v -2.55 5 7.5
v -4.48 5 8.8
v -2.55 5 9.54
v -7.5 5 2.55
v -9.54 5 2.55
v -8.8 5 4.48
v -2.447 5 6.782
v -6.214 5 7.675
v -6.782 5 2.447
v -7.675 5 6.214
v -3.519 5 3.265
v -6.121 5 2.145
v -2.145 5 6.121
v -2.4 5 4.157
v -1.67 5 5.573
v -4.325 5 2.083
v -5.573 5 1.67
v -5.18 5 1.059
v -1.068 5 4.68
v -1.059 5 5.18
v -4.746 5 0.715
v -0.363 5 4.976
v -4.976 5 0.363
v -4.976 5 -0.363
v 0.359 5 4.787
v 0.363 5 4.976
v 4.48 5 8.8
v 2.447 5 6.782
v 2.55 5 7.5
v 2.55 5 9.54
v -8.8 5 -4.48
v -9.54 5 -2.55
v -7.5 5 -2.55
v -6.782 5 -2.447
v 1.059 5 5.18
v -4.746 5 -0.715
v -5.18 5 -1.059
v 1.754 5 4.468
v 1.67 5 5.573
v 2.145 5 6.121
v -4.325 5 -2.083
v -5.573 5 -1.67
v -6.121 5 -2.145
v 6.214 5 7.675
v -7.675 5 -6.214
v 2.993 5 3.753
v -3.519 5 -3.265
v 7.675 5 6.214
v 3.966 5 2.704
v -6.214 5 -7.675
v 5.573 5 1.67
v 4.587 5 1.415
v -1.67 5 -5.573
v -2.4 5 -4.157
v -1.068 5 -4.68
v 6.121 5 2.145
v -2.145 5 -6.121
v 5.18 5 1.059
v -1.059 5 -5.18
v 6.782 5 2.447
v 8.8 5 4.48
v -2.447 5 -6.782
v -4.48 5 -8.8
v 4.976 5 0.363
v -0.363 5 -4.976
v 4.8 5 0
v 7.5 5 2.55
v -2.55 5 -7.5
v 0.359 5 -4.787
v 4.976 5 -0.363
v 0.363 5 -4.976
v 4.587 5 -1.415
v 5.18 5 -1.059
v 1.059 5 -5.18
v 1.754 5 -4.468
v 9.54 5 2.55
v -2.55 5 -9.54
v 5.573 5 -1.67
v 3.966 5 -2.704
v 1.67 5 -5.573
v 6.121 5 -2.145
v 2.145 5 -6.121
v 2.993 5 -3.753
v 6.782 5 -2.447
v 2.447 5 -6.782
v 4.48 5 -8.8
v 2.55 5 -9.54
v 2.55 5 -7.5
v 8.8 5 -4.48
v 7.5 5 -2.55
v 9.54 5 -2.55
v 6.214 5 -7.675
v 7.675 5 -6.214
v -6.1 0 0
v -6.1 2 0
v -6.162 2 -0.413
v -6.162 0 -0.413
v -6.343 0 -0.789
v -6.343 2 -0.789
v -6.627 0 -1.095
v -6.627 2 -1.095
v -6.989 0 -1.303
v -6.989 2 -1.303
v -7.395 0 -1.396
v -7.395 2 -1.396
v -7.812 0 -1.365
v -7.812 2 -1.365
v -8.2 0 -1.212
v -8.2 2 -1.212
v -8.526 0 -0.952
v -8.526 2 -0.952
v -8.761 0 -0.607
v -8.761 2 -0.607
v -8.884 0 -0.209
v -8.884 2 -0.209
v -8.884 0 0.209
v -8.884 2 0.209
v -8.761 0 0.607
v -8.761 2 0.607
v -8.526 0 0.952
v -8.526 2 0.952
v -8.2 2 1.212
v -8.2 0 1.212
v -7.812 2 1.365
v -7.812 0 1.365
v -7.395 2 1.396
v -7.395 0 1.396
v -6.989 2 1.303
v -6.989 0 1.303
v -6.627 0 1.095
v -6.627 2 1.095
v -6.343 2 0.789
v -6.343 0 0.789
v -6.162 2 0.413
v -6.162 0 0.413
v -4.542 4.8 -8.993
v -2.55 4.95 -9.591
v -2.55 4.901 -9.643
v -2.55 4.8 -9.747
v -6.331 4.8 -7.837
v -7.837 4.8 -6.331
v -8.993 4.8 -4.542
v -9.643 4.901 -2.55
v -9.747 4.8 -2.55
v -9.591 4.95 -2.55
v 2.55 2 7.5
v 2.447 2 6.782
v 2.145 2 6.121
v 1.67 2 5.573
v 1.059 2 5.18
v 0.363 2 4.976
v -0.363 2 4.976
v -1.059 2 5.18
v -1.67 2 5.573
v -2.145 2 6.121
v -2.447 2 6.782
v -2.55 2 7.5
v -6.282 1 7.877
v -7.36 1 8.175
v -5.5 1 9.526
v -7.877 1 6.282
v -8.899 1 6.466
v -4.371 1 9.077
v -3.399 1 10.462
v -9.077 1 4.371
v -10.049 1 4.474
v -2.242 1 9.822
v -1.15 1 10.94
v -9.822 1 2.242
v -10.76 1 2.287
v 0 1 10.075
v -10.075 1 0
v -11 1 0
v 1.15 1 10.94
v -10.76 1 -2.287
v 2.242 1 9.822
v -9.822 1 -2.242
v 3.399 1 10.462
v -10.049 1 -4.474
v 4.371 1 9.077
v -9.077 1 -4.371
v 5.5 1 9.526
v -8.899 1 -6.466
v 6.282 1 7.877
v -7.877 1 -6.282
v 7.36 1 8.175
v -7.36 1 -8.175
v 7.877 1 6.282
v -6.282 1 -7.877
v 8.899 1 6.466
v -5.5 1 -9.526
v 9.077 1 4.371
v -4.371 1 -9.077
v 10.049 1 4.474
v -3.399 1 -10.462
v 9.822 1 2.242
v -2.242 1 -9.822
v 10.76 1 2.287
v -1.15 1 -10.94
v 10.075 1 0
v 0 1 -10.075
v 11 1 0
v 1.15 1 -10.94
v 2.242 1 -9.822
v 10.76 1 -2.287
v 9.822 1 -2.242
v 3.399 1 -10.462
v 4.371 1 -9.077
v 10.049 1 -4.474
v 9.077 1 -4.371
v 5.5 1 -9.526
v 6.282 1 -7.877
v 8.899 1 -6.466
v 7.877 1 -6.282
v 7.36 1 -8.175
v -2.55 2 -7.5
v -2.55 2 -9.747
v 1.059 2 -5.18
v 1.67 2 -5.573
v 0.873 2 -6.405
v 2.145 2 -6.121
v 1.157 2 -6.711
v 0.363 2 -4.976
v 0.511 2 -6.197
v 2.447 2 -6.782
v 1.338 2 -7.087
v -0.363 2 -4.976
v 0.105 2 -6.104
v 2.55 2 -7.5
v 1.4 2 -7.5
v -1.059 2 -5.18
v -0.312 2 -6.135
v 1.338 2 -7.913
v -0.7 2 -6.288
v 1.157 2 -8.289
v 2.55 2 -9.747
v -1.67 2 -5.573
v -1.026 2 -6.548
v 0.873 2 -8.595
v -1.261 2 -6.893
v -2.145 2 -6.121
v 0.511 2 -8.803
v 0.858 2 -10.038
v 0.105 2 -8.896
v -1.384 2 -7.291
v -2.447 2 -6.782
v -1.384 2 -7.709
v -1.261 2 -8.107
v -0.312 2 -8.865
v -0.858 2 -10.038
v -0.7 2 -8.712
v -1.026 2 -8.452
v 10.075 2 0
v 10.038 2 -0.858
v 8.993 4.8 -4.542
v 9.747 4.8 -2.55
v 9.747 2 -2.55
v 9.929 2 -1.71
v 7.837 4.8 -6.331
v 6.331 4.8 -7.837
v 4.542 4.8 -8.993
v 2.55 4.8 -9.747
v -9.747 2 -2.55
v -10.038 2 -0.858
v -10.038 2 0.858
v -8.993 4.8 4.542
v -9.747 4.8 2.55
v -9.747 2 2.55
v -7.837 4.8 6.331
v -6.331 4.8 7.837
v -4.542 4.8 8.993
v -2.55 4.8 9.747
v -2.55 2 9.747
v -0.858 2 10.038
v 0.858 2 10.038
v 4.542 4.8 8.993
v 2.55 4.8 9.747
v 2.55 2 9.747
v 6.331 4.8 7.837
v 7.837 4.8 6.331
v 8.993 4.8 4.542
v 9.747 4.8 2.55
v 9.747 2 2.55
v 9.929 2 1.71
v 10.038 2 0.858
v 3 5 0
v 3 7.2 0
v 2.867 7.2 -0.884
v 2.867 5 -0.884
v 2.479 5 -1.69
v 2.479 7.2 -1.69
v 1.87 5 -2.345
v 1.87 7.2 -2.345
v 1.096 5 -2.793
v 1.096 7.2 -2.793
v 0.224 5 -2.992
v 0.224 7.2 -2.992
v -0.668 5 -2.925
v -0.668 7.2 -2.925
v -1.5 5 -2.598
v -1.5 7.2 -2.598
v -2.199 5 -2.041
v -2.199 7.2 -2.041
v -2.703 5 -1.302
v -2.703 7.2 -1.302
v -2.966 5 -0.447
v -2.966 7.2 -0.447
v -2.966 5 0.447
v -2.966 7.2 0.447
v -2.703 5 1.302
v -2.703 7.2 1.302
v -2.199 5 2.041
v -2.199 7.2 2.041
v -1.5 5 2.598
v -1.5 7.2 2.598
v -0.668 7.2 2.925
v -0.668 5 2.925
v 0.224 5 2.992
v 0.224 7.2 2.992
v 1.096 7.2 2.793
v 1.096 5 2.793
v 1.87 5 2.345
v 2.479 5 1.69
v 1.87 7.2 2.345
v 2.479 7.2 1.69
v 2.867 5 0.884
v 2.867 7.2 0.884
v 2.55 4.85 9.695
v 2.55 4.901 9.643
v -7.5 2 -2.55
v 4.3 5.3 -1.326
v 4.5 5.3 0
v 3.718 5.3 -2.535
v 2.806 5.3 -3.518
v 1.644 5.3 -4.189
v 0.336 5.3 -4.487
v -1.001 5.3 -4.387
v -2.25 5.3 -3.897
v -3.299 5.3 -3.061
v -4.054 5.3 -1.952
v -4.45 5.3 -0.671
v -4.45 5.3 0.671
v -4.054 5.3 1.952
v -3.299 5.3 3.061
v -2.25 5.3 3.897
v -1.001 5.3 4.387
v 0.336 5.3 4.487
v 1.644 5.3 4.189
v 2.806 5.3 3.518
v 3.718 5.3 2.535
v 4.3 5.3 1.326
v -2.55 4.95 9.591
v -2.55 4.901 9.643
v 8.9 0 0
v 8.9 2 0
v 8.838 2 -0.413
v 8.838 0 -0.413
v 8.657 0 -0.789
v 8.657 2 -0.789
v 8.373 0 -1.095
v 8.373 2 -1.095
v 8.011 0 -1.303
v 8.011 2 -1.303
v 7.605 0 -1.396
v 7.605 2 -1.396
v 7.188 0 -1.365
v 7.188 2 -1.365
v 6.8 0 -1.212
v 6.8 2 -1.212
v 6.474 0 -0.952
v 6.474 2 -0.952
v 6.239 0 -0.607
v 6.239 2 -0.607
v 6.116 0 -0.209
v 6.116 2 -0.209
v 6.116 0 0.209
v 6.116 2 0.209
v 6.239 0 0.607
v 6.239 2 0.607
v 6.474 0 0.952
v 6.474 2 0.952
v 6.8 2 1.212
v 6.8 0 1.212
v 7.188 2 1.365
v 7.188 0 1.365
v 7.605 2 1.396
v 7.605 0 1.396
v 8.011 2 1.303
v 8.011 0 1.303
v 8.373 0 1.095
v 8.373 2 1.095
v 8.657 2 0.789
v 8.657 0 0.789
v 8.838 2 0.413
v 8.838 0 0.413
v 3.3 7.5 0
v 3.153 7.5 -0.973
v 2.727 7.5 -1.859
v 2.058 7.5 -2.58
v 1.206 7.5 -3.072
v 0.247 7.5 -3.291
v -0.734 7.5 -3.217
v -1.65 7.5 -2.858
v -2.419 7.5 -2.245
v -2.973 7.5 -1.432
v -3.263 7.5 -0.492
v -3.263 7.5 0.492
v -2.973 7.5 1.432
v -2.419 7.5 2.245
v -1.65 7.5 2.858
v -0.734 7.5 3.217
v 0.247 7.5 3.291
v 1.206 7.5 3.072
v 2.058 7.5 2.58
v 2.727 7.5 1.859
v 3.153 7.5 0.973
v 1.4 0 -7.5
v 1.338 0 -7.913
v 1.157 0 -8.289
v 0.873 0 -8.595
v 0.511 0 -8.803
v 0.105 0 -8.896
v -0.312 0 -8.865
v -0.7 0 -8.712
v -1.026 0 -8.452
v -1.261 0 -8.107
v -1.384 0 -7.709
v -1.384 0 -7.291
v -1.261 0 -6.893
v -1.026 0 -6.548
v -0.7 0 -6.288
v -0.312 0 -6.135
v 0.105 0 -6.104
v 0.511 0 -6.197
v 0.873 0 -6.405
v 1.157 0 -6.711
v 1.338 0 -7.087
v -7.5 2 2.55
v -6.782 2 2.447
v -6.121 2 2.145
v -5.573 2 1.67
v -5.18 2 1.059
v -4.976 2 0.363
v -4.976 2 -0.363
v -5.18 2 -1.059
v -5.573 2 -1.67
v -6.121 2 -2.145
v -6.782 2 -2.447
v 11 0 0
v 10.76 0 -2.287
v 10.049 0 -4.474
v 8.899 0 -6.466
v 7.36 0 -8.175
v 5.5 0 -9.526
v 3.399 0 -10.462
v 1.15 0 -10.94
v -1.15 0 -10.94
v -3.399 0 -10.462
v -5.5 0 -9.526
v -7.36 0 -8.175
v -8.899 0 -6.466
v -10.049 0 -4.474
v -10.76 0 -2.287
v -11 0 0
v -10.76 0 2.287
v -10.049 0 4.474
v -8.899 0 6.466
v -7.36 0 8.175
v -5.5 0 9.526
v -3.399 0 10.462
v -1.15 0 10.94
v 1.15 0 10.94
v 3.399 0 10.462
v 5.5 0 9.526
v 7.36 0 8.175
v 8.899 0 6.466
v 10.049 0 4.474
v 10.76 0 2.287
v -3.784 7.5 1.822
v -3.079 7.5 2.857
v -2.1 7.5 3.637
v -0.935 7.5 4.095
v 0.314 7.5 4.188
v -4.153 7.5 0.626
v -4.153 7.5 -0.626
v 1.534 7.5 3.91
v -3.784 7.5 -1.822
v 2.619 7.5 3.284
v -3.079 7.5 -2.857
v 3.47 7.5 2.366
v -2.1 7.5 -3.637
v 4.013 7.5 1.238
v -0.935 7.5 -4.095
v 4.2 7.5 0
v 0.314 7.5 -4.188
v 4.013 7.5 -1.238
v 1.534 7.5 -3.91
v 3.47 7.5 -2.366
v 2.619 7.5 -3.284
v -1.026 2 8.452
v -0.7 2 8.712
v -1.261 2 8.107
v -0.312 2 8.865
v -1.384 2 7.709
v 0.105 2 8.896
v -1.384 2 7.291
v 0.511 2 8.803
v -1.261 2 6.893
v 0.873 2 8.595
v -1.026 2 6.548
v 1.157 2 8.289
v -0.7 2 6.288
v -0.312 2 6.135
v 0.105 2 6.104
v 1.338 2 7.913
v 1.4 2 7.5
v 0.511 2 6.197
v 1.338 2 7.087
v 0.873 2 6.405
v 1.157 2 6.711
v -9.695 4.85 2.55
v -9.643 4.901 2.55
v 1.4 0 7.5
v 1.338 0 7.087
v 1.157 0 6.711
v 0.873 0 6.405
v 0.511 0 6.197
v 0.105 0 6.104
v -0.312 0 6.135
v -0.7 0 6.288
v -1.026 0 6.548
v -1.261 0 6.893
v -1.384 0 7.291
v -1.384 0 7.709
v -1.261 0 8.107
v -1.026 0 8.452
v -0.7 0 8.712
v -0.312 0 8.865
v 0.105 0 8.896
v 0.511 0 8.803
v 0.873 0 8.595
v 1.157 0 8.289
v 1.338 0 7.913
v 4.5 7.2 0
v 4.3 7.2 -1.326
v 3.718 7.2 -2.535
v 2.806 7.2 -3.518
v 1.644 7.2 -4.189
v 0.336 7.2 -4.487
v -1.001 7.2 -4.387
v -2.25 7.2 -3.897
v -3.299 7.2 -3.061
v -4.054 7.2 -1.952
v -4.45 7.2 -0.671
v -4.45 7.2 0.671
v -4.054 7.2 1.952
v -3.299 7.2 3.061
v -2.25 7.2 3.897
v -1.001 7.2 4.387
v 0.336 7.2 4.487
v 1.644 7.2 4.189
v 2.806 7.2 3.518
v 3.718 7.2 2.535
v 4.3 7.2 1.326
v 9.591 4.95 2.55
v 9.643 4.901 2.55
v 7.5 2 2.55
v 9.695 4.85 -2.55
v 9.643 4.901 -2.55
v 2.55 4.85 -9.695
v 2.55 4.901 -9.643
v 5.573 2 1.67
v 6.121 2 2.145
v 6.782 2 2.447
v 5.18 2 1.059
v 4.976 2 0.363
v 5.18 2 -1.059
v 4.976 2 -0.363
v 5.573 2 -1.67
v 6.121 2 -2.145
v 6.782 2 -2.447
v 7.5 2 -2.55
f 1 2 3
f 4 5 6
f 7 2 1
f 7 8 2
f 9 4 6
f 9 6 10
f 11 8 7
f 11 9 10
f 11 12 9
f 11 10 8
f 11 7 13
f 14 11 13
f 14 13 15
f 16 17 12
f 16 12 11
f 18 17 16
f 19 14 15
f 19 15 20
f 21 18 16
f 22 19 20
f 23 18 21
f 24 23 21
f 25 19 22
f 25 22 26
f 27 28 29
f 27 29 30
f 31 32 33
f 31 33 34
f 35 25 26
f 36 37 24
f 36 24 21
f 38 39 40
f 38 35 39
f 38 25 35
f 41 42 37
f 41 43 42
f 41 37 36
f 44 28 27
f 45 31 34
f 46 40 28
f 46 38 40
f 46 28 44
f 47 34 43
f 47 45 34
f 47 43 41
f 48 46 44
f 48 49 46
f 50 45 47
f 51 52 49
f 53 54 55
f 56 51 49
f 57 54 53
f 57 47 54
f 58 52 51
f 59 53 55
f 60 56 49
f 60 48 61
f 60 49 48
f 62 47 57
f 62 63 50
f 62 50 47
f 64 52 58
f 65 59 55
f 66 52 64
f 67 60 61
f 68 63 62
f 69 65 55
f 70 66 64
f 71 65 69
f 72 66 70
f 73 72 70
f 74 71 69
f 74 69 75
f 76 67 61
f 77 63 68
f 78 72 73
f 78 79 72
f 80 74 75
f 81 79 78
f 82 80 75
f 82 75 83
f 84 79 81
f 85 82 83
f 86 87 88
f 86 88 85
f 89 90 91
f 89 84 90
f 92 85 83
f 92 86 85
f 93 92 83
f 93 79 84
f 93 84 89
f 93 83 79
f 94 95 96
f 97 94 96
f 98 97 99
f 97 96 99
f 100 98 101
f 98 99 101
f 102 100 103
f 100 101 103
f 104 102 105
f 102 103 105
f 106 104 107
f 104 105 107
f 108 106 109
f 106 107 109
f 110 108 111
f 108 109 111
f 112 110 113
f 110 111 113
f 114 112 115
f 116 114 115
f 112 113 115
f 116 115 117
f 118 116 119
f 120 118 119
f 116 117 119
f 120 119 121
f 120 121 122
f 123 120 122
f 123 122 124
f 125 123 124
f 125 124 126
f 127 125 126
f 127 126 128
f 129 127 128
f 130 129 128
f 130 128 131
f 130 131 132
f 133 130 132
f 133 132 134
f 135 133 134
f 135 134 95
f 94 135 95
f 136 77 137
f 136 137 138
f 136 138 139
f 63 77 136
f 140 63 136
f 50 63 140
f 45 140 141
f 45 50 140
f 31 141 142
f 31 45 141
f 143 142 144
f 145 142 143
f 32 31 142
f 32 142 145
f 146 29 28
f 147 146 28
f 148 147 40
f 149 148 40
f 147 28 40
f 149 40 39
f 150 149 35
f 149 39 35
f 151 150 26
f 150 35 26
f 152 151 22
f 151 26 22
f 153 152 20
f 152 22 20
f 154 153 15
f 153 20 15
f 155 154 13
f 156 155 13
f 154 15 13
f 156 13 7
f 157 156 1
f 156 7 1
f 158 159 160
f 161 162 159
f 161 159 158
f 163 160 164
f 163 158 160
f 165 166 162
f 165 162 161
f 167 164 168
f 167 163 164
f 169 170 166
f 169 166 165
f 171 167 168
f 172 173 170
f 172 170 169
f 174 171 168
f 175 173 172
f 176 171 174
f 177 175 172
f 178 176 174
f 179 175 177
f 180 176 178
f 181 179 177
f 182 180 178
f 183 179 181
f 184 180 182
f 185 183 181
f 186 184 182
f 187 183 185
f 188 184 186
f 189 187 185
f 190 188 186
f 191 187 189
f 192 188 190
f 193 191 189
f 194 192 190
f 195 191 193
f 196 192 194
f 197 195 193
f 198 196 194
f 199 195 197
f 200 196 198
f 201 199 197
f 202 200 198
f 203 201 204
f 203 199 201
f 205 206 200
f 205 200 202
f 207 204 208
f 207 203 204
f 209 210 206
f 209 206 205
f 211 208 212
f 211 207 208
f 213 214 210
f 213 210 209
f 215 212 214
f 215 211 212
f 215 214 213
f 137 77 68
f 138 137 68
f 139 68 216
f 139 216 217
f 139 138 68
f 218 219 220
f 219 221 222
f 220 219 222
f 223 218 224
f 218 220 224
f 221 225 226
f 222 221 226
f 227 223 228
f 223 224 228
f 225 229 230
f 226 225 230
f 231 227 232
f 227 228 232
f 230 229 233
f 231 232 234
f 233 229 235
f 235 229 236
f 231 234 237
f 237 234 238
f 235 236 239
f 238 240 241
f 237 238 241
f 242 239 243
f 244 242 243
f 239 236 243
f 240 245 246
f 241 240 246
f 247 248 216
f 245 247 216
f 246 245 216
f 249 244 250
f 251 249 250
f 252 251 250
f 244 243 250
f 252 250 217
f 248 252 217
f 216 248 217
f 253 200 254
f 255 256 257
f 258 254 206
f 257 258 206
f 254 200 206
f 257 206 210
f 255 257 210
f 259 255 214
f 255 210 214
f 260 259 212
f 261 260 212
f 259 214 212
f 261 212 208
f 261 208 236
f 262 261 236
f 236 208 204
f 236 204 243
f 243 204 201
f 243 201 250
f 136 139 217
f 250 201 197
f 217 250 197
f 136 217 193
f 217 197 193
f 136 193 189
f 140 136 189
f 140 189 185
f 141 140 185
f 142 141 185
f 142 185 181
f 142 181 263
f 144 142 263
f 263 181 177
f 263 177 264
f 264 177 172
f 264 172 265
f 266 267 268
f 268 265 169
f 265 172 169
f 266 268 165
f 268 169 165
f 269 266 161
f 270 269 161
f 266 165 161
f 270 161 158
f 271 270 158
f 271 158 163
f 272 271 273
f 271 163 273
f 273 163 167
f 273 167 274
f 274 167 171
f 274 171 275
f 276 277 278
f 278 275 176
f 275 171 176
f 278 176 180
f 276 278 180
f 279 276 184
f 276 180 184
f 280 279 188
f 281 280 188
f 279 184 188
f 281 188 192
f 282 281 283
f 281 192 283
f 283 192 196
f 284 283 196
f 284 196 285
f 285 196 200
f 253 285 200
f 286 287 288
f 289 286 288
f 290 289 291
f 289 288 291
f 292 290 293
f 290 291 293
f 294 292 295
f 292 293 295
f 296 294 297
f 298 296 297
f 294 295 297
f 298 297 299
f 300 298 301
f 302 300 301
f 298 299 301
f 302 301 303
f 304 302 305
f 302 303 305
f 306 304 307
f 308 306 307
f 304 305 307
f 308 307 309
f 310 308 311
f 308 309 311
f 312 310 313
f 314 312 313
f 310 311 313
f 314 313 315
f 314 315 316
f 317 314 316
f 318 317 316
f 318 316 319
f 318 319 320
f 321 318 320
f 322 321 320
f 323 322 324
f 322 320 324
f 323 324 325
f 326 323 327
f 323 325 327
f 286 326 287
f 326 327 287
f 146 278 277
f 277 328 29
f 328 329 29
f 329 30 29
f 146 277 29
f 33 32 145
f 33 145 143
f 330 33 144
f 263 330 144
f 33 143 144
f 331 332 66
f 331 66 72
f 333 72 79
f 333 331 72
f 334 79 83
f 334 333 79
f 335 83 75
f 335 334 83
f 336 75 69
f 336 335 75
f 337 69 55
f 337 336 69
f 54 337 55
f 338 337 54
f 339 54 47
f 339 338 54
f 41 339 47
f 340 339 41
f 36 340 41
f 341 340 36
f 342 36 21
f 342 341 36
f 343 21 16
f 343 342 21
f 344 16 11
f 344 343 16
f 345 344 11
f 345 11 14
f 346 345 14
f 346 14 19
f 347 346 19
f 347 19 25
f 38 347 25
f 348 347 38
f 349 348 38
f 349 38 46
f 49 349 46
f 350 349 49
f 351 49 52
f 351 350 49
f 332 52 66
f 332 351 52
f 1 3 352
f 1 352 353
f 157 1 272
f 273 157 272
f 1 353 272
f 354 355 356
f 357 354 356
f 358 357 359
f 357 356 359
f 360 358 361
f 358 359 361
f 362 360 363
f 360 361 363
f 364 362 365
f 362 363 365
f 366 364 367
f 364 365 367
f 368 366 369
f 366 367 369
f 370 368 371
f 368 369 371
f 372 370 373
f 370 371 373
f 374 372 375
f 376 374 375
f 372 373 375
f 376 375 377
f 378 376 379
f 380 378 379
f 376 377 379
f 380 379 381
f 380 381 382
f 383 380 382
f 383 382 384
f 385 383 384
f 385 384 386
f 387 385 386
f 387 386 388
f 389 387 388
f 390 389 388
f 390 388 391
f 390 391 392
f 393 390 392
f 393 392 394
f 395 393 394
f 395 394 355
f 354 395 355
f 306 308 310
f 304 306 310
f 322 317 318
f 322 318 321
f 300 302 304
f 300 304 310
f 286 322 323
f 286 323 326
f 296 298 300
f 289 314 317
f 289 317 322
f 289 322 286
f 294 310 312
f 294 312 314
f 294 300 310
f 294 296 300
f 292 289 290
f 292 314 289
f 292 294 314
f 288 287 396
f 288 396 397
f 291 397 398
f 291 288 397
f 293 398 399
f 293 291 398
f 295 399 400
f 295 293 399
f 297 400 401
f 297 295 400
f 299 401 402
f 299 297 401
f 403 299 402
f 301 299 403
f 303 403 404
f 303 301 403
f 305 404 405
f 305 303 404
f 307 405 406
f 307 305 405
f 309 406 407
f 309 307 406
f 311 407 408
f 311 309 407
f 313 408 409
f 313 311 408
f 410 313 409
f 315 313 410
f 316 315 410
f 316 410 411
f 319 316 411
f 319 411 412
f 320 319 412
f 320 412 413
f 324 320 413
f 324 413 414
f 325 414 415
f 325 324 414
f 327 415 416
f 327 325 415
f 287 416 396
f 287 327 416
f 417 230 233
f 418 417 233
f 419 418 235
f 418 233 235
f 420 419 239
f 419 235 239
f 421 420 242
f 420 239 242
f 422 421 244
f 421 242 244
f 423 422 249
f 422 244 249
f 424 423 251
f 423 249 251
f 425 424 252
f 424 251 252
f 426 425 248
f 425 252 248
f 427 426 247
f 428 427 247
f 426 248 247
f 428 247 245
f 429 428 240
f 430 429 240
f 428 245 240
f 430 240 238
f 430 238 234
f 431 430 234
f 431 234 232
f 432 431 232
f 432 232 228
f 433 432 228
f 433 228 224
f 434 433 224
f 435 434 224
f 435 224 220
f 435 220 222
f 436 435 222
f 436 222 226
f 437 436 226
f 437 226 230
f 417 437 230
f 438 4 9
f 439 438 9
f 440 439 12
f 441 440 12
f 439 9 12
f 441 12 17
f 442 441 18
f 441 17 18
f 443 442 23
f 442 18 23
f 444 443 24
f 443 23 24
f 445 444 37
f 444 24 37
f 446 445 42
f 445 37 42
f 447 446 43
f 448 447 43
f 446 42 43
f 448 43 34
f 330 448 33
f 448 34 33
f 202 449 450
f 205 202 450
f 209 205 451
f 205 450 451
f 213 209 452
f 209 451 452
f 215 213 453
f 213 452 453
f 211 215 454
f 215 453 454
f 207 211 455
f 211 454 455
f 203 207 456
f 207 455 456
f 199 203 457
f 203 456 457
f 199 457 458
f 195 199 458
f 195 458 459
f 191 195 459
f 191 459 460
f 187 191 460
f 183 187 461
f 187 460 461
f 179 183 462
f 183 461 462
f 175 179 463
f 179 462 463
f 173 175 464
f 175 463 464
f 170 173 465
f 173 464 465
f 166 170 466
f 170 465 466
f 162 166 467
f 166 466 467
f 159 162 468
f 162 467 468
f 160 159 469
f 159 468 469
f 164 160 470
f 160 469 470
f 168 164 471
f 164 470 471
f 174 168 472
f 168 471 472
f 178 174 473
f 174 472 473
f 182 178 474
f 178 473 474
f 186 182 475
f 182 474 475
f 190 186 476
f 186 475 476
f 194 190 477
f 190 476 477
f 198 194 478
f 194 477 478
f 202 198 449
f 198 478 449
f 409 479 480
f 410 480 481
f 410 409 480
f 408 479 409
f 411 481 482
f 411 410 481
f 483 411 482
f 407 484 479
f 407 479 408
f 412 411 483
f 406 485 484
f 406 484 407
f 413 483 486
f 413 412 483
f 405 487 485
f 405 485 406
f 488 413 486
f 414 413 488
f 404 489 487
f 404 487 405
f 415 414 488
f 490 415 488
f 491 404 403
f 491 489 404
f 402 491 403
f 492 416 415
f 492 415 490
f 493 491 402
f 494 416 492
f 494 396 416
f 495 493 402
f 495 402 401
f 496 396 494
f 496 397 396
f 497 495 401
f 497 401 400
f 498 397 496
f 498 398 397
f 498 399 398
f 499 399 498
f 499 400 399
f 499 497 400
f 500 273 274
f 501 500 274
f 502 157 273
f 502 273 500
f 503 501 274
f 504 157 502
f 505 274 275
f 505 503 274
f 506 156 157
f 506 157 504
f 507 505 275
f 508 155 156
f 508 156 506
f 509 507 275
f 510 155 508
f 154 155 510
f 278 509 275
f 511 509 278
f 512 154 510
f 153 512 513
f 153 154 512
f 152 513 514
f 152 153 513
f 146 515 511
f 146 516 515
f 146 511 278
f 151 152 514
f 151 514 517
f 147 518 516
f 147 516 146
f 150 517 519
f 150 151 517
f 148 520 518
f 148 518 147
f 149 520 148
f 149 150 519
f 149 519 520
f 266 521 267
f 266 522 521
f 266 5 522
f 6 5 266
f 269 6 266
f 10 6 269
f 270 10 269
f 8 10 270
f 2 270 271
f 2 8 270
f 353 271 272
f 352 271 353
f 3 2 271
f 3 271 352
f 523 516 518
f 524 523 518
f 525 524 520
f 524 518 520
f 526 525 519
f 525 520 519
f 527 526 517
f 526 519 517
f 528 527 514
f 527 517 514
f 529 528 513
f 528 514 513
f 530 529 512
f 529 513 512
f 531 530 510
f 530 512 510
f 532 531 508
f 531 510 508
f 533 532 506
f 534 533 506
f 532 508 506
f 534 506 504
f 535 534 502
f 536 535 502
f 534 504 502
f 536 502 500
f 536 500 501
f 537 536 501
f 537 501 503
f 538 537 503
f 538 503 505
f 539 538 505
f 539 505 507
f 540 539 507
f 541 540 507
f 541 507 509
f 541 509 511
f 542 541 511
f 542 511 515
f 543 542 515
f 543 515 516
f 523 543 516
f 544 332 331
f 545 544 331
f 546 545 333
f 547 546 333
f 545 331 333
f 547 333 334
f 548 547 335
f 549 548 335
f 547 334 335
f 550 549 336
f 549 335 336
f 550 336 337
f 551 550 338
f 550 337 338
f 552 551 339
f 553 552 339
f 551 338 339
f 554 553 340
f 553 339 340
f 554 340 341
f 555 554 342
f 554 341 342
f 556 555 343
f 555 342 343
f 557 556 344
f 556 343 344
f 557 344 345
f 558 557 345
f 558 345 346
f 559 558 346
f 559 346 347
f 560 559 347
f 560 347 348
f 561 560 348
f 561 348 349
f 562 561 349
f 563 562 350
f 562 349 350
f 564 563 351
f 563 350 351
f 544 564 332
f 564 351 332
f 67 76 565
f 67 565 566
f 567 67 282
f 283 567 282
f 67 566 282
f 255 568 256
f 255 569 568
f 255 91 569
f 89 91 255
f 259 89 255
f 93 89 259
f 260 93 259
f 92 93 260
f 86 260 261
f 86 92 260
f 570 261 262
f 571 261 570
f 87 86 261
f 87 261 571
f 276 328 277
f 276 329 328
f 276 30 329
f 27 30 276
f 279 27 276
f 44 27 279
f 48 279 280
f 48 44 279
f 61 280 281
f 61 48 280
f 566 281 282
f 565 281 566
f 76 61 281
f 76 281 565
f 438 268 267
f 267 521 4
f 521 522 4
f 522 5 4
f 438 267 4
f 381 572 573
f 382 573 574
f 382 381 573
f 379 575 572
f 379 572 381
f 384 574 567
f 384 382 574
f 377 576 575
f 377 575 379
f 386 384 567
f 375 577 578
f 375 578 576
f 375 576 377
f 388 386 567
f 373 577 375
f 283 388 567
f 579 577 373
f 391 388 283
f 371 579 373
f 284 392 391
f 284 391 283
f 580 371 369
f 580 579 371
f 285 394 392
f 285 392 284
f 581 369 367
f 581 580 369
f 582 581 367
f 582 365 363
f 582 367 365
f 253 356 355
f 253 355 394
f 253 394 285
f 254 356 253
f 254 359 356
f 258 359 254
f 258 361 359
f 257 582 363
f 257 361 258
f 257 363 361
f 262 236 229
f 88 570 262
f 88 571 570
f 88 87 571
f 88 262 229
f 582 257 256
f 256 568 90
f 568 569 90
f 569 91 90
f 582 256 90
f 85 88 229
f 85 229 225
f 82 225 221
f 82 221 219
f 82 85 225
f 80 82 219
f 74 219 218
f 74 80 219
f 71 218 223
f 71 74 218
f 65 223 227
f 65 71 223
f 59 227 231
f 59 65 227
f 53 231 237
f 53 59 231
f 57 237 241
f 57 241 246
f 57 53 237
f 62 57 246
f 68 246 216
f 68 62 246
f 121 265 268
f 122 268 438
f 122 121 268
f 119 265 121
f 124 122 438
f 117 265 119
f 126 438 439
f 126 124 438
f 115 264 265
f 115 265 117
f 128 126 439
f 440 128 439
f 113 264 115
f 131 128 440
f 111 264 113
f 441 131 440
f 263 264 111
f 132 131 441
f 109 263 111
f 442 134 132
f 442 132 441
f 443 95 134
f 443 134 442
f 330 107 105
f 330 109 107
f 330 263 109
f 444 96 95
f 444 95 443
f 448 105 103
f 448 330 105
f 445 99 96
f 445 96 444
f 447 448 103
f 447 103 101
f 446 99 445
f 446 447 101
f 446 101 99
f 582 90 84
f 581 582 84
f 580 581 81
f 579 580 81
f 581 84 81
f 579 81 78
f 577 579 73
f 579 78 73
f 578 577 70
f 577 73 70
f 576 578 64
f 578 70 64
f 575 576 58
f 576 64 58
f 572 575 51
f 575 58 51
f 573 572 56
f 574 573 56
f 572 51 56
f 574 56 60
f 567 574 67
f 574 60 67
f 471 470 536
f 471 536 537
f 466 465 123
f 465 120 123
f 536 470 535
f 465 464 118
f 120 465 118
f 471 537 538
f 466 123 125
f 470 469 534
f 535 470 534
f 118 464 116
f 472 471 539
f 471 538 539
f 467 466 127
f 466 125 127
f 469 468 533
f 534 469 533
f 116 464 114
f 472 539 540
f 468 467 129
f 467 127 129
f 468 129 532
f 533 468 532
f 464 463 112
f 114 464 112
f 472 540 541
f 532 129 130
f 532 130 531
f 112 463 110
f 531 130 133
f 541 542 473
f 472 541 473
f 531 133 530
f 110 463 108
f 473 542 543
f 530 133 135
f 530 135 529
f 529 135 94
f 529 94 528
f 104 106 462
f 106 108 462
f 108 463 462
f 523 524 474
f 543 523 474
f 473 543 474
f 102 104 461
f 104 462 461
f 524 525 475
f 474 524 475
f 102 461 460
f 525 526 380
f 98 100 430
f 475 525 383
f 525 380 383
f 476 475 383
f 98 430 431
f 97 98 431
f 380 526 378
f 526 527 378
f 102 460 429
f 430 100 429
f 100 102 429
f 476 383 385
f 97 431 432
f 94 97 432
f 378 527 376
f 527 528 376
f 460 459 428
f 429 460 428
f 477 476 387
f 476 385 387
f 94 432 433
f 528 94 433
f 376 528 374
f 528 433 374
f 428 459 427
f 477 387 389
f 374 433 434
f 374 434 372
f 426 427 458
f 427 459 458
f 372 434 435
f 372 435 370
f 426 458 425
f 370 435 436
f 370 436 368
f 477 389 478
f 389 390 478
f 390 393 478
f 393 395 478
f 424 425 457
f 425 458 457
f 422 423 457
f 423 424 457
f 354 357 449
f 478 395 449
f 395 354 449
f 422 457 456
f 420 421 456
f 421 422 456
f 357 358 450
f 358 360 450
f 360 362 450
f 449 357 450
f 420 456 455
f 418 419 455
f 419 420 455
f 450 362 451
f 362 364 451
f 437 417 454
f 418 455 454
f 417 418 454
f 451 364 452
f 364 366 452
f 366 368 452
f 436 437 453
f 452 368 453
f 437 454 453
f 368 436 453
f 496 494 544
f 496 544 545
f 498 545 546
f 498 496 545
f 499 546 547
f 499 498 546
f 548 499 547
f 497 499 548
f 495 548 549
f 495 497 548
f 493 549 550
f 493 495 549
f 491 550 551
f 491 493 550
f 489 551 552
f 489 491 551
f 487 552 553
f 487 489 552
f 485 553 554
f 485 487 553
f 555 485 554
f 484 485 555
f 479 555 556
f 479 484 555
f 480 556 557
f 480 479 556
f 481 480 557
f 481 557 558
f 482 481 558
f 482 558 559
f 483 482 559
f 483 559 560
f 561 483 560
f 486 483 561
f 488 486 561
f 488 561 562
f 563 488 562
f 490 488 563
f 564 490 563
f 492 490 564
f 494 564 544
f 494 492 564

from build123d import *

# Parameters (mm, degrees)
SKETCH1_R           = 11
BOSS_EXTRUDE1_DEPTH = 1
SKETCH2_R           = 10.075
BOSS_EXTRUDE2_DEPTH = 4
CHAMFER1_SIZE       = 0.2
SKETCH3_R           = 1.4
CUT_EXTRUDE1_DEPTH  = 6
CUT_EXTRUDE2_DEPTH  = 3
SKETCH5_R           = 4.5
BOSS_EXTRUDE3_DEPTH = 2.5
SKETCH6_R           = 3
CUT_EXTRUDE3_DEPTH  = 2.5
CHAMFER2_SIZE       = 0.3


with BuildPart() as part:
    # Sketch1 → Boss-Extrude1 (new body)
    with BuildSketch(Plane(origin=(0, 0, 0), x_dir=(1, 0, 0), z_dir=(0, 1, 0))):
        Circle(SKETCH1_R)
    extrude(amount=BOSS_EXTRUDE1_DEPTH)

    # Sketch2 → Boss-Extrude2 (add)
    with BuildSketch(Plane(origin=(0, 1, 0), x_dir=(1, 0, 0), z_dir=(0, 1, 0))):
        Circle(SKETCH2_R)
    extrude(amount=BOSS_EXTRUDE2_DEPTH)

    # Chamfer1
    chamfer1_edges = [part.edges().sort_by_distance(p)[0] for p in [
        (-10.075, 5, 0),
    ]]
    chamfer(chamfer1_edges, length=CHAMFER1_SIZE)

    # Sketch3 → Cut-Extrude1 (cut, through all)
    with BuildSketch(Plane(origin=(0, 5, 0), x_dir=(1, 0, 0), z_dir=(0, 1, 0))):
        with Locations((0, 7.5)):
            Circle(SKETCH3_R)
        with Locations((7.5, 0)):
            Circle(SKETCH3_R)
        with Locations((0, -7.5)):
            Circle(SKETCH3_R)
        with Locations((-7.5, 0)):
            Circle(SKETCH3_R)
    extrude(amount=-CUT_EXTRUDE1_DEPTH, mode=Mode.SUBTRACT)

    # Sketch4 → Cut-Extrude2 (cut)
    with BuildSketch(Plane(origin=(0, 5, 0), x_dir=(1, 0, 0), z_dir=(0, 1, 0))):
        with BuildLine():
            Line((-2.55, 7.5), (-2.55, 9.746954653))
            ThreePointArc((-2.55, 9.746954653), (0, 10.075), (2.55, 9.746954653))
            Line((2.55, 9.746954653), (2.55, 7.5))
            ThreePointArc((2.55, 7.5), (0, 4.95), (-2.55, 7.5))
        make_face()
        with BuildLine():
            Line((7.5, -2.55), (9.746954653, -2.55))
            ThreePointArc((9.746954653, -2.55), (10.075, 0), (9.746954653, 2.55))
            Line((9.746954653, 2.55), (7.5, 2.55))
            ThreePointArc((7.5, 2.55), (4.95, 0), (7.5, -2.55))
        make_face()
        with BuildLine():
            Line((-2.55, -7.5), (-2.55, -9.746954653))
            ThreePointArc((-2.55, -9.746954653), (0, -10.075), (2.55, -9.746954653))
            Line((2.55, -9.746954653), (2.55, -7.5))
            ThreePointArc((2.55, -7.5), (0, -4.95), (-2.55, -7.5))
        make_face()
        with BuildLine():
            Line((-7.5, 2.55), (-9.746954653, 2.55))
            ThreePointArc((-9.746954653, 2.55), (-10.075, 0), (-9.746954653, -2.55))
            Line((-9.746954653, -2.55), (-7.5, -2.55))
            ThreePointArc((-7.5, -2.55), (-4.95, 0), (-7.5, 2.55))
        make_face()
    extrude(amount=-CUT_EXTRUDE2_DEPTH, mode=Mode.SUBTRACT)

    # Sketch5 → Boss-Extrude3 (add)
    with BuildSketch(Plane(origin=(0, 5, 0), x_dir=(1, 0, 0), z_dir=(0, 1, 0))):
        Circle(SKETCH5_R)
    extrude(amount=BOSS_EXTRUDE3_DEPTH)

    # Sketch6 → Cut-Extrude3 (cut)
    with BuildSketch(Plane(origin=(0, 7.5, 0), x_dir=(1, 0, 0), z_dir=(0, 1, 0))):
        Circle(SKETCH6_R)
    extrude(amount=-CUT_EXTRUDE3_DEPTH, mode=Mode.SUBTRACT)

    # Chamfer2
    chamfer2_edges = [part.edges().sort_by_distance(p)[0] for p in [
        (-4.5, 5, 0),
        (-4.5, 7.5, 0),
        (-3, 7.5, 0),
    ]]
    chamfer(chamfer2_edges, length=CHAMFER2_SIZE)


solid = part.part
